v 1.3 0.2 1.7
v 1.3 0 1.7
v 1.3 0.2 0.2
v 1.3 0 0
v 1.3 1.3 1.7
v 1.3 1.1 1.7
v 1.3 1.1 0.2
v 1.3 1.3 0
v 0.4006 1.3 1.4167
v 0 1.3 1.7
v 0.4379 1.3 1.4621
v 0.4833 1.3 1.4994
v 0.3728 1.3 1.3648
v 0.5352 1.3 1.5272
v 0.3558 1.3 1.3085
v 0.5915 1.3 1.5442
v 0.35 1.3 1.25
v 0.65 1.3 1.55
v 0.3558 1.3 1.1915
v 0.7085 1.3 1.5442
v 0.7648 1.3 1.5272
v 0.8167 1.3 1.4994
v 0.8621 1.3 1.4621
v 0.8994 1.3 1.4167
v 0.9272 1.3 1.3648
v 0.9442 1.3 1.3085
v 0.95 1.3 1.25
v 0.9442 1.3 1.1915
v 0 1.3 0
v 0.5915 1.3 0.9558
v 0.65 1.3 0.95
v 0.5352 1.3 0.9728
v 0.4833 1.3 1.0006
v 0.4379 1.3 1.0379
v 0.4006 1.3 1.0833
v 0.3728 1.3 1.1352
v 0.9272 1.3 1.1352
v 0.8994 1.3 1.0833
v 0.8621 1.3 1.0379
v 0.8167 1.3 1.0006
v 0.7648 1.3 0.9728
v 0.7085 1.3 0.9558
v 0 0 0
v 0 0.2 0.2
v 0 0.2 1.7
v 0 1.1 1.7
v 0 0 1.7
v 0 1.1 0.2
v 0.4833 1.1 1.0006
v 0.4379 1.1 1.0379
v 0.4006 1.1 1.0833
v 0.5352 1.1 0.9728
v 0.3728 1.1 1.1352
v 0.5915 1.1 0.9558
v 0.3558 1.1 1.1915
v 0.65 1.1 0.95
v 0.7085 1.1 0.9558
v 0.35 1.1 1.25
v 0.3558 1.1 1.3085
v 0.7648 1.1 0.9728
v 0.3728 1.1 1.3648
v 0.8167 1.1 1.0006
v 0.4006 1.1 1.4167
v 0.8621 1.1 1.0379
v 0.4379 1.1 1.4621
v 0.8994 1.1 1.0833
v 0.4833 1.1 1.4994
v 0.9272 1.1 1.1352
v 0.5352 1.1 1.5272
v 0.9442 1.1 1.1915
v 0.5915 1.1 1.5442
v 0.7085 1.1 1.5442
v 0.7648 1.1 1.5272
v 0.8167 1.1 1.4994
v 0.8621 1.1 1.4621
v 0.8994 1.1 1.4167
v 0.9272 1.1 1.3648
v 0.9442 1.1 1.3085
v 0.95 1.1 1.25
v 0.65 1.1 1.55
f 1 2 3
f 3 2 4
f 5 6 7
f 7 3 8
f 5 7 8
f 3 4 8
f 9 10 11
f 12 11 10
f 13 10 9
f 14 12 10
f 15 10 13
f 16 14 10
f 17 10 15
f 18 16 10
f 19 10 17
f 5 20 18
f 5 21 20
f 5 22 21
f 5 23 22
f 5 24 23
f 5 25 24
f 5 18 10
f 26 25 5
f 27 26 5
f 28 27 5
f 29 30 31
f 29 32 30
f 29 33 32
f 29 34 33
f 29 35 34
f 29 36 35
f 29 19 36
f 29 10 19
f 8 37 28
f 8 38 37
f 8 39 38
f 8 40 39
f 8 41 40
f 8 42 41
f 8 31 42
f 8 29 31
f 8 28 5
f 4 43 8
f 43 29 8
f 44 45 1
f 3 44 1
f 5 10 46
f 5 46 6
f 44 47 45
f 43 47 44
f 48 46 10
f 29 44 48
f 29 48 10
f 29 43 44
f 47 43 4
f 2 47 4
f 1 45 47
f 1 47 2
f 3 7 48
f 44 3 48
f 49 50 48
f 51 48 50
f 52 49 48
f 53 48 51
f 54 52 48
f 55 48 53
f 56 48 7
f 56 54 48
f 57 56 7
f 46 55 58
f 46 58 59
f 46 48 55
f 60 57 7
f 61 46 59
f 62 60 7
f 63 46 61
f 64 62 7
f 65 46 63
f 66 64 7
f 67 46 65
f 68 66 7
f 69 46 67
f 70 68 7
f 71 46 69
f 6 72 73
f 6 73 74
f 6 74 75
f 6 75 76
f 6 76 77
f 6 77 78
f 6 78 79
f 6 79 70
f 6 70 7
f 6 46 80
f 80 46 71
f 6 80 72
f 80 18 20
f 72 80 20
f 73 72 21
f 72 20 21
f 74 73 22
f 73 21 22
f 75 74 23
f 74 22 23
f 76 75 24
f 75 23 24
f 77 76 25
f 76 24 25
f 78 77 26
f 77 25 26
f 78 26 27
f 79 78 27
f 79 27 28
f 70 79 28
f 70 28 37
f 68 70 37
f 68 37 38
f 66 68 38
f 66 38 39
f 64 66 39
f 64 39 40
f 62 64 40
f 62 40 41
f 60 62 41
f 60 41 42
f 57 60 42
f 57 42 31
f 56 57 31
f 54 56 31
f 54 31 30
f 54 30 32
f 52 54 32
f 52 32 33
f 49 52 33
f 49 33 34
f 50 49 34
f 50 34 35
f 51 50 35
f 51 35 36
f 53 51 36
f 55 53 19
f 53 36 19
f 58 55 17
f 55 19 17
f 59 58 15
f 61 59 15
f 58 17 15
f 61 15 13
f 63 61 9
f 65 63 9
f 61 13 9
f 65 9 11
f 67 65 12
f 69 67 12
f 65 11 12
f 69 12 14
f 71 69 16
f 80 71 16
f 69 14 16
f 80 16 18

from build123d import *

# Parameters (mm, degrees)
SKETCH2_W           = 1.3
SKETCH2_H           = 1.3
BOSS_EXTRUDE2_DEPTH = 1.7
SKETCH10_W          = 1.3
SKETCH10_H          = 0.9
CUT_EXTRUDE4_DEPTH  = 2
SKETCH12_R          = 0.3
CUT_EXTRUDE5_DEPTH  = 1.3
SKETCH14_W          = 1.3
SKETCH14_H          = 1.3
BOSS_EXTRUDE3_DEPTH = 0.2


with BuildPart() as part:
    # Sketch2 → Boss-Extrude2 (new body)
    with BuildSketch(Plane.XY):
        with Locations((0.65, 0.65)):
            Rectangle(SKETCH2_W, SKETCH2_H)
    extrude(amount=BOSS_EXTRUDE2_DEPTH)

    # Sketch10 → Cut-Extrude4 (cut)
    with BuildSketch(Plane.XY.offset(1.7)):
        with Locations((0.65, 0.65)):
            Rectangle(SKETCH10_W, SKETCH10_H)
    extrude(amount=-CUT_EXTRUDE4_DEPTH, mode=Mode.SUBTRACT)


with BuildPart() as cut_extrude4_piece_1:
    # of the separate pieces the step leaves, piece 1, a body of its own (cut_extrude4_pieces)
    add(part.part.solids().sort_by_distance((0, 1.3, 0))[0])

    # Sketch12 → Cut-Extrude5 (cut)
    with BuildSketch(Plane(origin=(0, 1.3, 0), x_dir=(1, 0, 0), z_dir=(0, 1, 0))):
        with Locations(Location((0.65, -1.25, 0), (0, 0, 270))):
            Circle(SKETCH12_R)
    extrude(amount=-CUT_EXTRUDE5_DEPTH, mode=Mode.SUBTRACT)



with BuildPart() as cut_extrude4_piece_2:
    # of the separate pieces the step leaves, piece 2, a body of its own (cut_extrude4_pieces)
    add(part.part.solids().sort_by_distance((0, 0, 0))[0])


with BuildPart() as cut_extrude4_piece_1_1:
    add(cut_extrude4_piece_1.part)

    add(cut_extrude4_piece_2.part)  # Boss-Extrude3 merges Cut-Extrude4 piece 2
    # Sketch14 → Boss-Extrude3 (add)
    with BuildSketch(Plane(origin=(0, 0, 0), x_dir=(-1, 0, 0), z_dir=(0, 0, -1))):
        with Locations((-0.65, 0.65)):
            Rectangle(SKETCH14_W, SKETCH14_H)
    extrude(amount=-BOSS_EXTRUDE3_DEPTH)


solid = cut_extrude4_piece_1_1.part
